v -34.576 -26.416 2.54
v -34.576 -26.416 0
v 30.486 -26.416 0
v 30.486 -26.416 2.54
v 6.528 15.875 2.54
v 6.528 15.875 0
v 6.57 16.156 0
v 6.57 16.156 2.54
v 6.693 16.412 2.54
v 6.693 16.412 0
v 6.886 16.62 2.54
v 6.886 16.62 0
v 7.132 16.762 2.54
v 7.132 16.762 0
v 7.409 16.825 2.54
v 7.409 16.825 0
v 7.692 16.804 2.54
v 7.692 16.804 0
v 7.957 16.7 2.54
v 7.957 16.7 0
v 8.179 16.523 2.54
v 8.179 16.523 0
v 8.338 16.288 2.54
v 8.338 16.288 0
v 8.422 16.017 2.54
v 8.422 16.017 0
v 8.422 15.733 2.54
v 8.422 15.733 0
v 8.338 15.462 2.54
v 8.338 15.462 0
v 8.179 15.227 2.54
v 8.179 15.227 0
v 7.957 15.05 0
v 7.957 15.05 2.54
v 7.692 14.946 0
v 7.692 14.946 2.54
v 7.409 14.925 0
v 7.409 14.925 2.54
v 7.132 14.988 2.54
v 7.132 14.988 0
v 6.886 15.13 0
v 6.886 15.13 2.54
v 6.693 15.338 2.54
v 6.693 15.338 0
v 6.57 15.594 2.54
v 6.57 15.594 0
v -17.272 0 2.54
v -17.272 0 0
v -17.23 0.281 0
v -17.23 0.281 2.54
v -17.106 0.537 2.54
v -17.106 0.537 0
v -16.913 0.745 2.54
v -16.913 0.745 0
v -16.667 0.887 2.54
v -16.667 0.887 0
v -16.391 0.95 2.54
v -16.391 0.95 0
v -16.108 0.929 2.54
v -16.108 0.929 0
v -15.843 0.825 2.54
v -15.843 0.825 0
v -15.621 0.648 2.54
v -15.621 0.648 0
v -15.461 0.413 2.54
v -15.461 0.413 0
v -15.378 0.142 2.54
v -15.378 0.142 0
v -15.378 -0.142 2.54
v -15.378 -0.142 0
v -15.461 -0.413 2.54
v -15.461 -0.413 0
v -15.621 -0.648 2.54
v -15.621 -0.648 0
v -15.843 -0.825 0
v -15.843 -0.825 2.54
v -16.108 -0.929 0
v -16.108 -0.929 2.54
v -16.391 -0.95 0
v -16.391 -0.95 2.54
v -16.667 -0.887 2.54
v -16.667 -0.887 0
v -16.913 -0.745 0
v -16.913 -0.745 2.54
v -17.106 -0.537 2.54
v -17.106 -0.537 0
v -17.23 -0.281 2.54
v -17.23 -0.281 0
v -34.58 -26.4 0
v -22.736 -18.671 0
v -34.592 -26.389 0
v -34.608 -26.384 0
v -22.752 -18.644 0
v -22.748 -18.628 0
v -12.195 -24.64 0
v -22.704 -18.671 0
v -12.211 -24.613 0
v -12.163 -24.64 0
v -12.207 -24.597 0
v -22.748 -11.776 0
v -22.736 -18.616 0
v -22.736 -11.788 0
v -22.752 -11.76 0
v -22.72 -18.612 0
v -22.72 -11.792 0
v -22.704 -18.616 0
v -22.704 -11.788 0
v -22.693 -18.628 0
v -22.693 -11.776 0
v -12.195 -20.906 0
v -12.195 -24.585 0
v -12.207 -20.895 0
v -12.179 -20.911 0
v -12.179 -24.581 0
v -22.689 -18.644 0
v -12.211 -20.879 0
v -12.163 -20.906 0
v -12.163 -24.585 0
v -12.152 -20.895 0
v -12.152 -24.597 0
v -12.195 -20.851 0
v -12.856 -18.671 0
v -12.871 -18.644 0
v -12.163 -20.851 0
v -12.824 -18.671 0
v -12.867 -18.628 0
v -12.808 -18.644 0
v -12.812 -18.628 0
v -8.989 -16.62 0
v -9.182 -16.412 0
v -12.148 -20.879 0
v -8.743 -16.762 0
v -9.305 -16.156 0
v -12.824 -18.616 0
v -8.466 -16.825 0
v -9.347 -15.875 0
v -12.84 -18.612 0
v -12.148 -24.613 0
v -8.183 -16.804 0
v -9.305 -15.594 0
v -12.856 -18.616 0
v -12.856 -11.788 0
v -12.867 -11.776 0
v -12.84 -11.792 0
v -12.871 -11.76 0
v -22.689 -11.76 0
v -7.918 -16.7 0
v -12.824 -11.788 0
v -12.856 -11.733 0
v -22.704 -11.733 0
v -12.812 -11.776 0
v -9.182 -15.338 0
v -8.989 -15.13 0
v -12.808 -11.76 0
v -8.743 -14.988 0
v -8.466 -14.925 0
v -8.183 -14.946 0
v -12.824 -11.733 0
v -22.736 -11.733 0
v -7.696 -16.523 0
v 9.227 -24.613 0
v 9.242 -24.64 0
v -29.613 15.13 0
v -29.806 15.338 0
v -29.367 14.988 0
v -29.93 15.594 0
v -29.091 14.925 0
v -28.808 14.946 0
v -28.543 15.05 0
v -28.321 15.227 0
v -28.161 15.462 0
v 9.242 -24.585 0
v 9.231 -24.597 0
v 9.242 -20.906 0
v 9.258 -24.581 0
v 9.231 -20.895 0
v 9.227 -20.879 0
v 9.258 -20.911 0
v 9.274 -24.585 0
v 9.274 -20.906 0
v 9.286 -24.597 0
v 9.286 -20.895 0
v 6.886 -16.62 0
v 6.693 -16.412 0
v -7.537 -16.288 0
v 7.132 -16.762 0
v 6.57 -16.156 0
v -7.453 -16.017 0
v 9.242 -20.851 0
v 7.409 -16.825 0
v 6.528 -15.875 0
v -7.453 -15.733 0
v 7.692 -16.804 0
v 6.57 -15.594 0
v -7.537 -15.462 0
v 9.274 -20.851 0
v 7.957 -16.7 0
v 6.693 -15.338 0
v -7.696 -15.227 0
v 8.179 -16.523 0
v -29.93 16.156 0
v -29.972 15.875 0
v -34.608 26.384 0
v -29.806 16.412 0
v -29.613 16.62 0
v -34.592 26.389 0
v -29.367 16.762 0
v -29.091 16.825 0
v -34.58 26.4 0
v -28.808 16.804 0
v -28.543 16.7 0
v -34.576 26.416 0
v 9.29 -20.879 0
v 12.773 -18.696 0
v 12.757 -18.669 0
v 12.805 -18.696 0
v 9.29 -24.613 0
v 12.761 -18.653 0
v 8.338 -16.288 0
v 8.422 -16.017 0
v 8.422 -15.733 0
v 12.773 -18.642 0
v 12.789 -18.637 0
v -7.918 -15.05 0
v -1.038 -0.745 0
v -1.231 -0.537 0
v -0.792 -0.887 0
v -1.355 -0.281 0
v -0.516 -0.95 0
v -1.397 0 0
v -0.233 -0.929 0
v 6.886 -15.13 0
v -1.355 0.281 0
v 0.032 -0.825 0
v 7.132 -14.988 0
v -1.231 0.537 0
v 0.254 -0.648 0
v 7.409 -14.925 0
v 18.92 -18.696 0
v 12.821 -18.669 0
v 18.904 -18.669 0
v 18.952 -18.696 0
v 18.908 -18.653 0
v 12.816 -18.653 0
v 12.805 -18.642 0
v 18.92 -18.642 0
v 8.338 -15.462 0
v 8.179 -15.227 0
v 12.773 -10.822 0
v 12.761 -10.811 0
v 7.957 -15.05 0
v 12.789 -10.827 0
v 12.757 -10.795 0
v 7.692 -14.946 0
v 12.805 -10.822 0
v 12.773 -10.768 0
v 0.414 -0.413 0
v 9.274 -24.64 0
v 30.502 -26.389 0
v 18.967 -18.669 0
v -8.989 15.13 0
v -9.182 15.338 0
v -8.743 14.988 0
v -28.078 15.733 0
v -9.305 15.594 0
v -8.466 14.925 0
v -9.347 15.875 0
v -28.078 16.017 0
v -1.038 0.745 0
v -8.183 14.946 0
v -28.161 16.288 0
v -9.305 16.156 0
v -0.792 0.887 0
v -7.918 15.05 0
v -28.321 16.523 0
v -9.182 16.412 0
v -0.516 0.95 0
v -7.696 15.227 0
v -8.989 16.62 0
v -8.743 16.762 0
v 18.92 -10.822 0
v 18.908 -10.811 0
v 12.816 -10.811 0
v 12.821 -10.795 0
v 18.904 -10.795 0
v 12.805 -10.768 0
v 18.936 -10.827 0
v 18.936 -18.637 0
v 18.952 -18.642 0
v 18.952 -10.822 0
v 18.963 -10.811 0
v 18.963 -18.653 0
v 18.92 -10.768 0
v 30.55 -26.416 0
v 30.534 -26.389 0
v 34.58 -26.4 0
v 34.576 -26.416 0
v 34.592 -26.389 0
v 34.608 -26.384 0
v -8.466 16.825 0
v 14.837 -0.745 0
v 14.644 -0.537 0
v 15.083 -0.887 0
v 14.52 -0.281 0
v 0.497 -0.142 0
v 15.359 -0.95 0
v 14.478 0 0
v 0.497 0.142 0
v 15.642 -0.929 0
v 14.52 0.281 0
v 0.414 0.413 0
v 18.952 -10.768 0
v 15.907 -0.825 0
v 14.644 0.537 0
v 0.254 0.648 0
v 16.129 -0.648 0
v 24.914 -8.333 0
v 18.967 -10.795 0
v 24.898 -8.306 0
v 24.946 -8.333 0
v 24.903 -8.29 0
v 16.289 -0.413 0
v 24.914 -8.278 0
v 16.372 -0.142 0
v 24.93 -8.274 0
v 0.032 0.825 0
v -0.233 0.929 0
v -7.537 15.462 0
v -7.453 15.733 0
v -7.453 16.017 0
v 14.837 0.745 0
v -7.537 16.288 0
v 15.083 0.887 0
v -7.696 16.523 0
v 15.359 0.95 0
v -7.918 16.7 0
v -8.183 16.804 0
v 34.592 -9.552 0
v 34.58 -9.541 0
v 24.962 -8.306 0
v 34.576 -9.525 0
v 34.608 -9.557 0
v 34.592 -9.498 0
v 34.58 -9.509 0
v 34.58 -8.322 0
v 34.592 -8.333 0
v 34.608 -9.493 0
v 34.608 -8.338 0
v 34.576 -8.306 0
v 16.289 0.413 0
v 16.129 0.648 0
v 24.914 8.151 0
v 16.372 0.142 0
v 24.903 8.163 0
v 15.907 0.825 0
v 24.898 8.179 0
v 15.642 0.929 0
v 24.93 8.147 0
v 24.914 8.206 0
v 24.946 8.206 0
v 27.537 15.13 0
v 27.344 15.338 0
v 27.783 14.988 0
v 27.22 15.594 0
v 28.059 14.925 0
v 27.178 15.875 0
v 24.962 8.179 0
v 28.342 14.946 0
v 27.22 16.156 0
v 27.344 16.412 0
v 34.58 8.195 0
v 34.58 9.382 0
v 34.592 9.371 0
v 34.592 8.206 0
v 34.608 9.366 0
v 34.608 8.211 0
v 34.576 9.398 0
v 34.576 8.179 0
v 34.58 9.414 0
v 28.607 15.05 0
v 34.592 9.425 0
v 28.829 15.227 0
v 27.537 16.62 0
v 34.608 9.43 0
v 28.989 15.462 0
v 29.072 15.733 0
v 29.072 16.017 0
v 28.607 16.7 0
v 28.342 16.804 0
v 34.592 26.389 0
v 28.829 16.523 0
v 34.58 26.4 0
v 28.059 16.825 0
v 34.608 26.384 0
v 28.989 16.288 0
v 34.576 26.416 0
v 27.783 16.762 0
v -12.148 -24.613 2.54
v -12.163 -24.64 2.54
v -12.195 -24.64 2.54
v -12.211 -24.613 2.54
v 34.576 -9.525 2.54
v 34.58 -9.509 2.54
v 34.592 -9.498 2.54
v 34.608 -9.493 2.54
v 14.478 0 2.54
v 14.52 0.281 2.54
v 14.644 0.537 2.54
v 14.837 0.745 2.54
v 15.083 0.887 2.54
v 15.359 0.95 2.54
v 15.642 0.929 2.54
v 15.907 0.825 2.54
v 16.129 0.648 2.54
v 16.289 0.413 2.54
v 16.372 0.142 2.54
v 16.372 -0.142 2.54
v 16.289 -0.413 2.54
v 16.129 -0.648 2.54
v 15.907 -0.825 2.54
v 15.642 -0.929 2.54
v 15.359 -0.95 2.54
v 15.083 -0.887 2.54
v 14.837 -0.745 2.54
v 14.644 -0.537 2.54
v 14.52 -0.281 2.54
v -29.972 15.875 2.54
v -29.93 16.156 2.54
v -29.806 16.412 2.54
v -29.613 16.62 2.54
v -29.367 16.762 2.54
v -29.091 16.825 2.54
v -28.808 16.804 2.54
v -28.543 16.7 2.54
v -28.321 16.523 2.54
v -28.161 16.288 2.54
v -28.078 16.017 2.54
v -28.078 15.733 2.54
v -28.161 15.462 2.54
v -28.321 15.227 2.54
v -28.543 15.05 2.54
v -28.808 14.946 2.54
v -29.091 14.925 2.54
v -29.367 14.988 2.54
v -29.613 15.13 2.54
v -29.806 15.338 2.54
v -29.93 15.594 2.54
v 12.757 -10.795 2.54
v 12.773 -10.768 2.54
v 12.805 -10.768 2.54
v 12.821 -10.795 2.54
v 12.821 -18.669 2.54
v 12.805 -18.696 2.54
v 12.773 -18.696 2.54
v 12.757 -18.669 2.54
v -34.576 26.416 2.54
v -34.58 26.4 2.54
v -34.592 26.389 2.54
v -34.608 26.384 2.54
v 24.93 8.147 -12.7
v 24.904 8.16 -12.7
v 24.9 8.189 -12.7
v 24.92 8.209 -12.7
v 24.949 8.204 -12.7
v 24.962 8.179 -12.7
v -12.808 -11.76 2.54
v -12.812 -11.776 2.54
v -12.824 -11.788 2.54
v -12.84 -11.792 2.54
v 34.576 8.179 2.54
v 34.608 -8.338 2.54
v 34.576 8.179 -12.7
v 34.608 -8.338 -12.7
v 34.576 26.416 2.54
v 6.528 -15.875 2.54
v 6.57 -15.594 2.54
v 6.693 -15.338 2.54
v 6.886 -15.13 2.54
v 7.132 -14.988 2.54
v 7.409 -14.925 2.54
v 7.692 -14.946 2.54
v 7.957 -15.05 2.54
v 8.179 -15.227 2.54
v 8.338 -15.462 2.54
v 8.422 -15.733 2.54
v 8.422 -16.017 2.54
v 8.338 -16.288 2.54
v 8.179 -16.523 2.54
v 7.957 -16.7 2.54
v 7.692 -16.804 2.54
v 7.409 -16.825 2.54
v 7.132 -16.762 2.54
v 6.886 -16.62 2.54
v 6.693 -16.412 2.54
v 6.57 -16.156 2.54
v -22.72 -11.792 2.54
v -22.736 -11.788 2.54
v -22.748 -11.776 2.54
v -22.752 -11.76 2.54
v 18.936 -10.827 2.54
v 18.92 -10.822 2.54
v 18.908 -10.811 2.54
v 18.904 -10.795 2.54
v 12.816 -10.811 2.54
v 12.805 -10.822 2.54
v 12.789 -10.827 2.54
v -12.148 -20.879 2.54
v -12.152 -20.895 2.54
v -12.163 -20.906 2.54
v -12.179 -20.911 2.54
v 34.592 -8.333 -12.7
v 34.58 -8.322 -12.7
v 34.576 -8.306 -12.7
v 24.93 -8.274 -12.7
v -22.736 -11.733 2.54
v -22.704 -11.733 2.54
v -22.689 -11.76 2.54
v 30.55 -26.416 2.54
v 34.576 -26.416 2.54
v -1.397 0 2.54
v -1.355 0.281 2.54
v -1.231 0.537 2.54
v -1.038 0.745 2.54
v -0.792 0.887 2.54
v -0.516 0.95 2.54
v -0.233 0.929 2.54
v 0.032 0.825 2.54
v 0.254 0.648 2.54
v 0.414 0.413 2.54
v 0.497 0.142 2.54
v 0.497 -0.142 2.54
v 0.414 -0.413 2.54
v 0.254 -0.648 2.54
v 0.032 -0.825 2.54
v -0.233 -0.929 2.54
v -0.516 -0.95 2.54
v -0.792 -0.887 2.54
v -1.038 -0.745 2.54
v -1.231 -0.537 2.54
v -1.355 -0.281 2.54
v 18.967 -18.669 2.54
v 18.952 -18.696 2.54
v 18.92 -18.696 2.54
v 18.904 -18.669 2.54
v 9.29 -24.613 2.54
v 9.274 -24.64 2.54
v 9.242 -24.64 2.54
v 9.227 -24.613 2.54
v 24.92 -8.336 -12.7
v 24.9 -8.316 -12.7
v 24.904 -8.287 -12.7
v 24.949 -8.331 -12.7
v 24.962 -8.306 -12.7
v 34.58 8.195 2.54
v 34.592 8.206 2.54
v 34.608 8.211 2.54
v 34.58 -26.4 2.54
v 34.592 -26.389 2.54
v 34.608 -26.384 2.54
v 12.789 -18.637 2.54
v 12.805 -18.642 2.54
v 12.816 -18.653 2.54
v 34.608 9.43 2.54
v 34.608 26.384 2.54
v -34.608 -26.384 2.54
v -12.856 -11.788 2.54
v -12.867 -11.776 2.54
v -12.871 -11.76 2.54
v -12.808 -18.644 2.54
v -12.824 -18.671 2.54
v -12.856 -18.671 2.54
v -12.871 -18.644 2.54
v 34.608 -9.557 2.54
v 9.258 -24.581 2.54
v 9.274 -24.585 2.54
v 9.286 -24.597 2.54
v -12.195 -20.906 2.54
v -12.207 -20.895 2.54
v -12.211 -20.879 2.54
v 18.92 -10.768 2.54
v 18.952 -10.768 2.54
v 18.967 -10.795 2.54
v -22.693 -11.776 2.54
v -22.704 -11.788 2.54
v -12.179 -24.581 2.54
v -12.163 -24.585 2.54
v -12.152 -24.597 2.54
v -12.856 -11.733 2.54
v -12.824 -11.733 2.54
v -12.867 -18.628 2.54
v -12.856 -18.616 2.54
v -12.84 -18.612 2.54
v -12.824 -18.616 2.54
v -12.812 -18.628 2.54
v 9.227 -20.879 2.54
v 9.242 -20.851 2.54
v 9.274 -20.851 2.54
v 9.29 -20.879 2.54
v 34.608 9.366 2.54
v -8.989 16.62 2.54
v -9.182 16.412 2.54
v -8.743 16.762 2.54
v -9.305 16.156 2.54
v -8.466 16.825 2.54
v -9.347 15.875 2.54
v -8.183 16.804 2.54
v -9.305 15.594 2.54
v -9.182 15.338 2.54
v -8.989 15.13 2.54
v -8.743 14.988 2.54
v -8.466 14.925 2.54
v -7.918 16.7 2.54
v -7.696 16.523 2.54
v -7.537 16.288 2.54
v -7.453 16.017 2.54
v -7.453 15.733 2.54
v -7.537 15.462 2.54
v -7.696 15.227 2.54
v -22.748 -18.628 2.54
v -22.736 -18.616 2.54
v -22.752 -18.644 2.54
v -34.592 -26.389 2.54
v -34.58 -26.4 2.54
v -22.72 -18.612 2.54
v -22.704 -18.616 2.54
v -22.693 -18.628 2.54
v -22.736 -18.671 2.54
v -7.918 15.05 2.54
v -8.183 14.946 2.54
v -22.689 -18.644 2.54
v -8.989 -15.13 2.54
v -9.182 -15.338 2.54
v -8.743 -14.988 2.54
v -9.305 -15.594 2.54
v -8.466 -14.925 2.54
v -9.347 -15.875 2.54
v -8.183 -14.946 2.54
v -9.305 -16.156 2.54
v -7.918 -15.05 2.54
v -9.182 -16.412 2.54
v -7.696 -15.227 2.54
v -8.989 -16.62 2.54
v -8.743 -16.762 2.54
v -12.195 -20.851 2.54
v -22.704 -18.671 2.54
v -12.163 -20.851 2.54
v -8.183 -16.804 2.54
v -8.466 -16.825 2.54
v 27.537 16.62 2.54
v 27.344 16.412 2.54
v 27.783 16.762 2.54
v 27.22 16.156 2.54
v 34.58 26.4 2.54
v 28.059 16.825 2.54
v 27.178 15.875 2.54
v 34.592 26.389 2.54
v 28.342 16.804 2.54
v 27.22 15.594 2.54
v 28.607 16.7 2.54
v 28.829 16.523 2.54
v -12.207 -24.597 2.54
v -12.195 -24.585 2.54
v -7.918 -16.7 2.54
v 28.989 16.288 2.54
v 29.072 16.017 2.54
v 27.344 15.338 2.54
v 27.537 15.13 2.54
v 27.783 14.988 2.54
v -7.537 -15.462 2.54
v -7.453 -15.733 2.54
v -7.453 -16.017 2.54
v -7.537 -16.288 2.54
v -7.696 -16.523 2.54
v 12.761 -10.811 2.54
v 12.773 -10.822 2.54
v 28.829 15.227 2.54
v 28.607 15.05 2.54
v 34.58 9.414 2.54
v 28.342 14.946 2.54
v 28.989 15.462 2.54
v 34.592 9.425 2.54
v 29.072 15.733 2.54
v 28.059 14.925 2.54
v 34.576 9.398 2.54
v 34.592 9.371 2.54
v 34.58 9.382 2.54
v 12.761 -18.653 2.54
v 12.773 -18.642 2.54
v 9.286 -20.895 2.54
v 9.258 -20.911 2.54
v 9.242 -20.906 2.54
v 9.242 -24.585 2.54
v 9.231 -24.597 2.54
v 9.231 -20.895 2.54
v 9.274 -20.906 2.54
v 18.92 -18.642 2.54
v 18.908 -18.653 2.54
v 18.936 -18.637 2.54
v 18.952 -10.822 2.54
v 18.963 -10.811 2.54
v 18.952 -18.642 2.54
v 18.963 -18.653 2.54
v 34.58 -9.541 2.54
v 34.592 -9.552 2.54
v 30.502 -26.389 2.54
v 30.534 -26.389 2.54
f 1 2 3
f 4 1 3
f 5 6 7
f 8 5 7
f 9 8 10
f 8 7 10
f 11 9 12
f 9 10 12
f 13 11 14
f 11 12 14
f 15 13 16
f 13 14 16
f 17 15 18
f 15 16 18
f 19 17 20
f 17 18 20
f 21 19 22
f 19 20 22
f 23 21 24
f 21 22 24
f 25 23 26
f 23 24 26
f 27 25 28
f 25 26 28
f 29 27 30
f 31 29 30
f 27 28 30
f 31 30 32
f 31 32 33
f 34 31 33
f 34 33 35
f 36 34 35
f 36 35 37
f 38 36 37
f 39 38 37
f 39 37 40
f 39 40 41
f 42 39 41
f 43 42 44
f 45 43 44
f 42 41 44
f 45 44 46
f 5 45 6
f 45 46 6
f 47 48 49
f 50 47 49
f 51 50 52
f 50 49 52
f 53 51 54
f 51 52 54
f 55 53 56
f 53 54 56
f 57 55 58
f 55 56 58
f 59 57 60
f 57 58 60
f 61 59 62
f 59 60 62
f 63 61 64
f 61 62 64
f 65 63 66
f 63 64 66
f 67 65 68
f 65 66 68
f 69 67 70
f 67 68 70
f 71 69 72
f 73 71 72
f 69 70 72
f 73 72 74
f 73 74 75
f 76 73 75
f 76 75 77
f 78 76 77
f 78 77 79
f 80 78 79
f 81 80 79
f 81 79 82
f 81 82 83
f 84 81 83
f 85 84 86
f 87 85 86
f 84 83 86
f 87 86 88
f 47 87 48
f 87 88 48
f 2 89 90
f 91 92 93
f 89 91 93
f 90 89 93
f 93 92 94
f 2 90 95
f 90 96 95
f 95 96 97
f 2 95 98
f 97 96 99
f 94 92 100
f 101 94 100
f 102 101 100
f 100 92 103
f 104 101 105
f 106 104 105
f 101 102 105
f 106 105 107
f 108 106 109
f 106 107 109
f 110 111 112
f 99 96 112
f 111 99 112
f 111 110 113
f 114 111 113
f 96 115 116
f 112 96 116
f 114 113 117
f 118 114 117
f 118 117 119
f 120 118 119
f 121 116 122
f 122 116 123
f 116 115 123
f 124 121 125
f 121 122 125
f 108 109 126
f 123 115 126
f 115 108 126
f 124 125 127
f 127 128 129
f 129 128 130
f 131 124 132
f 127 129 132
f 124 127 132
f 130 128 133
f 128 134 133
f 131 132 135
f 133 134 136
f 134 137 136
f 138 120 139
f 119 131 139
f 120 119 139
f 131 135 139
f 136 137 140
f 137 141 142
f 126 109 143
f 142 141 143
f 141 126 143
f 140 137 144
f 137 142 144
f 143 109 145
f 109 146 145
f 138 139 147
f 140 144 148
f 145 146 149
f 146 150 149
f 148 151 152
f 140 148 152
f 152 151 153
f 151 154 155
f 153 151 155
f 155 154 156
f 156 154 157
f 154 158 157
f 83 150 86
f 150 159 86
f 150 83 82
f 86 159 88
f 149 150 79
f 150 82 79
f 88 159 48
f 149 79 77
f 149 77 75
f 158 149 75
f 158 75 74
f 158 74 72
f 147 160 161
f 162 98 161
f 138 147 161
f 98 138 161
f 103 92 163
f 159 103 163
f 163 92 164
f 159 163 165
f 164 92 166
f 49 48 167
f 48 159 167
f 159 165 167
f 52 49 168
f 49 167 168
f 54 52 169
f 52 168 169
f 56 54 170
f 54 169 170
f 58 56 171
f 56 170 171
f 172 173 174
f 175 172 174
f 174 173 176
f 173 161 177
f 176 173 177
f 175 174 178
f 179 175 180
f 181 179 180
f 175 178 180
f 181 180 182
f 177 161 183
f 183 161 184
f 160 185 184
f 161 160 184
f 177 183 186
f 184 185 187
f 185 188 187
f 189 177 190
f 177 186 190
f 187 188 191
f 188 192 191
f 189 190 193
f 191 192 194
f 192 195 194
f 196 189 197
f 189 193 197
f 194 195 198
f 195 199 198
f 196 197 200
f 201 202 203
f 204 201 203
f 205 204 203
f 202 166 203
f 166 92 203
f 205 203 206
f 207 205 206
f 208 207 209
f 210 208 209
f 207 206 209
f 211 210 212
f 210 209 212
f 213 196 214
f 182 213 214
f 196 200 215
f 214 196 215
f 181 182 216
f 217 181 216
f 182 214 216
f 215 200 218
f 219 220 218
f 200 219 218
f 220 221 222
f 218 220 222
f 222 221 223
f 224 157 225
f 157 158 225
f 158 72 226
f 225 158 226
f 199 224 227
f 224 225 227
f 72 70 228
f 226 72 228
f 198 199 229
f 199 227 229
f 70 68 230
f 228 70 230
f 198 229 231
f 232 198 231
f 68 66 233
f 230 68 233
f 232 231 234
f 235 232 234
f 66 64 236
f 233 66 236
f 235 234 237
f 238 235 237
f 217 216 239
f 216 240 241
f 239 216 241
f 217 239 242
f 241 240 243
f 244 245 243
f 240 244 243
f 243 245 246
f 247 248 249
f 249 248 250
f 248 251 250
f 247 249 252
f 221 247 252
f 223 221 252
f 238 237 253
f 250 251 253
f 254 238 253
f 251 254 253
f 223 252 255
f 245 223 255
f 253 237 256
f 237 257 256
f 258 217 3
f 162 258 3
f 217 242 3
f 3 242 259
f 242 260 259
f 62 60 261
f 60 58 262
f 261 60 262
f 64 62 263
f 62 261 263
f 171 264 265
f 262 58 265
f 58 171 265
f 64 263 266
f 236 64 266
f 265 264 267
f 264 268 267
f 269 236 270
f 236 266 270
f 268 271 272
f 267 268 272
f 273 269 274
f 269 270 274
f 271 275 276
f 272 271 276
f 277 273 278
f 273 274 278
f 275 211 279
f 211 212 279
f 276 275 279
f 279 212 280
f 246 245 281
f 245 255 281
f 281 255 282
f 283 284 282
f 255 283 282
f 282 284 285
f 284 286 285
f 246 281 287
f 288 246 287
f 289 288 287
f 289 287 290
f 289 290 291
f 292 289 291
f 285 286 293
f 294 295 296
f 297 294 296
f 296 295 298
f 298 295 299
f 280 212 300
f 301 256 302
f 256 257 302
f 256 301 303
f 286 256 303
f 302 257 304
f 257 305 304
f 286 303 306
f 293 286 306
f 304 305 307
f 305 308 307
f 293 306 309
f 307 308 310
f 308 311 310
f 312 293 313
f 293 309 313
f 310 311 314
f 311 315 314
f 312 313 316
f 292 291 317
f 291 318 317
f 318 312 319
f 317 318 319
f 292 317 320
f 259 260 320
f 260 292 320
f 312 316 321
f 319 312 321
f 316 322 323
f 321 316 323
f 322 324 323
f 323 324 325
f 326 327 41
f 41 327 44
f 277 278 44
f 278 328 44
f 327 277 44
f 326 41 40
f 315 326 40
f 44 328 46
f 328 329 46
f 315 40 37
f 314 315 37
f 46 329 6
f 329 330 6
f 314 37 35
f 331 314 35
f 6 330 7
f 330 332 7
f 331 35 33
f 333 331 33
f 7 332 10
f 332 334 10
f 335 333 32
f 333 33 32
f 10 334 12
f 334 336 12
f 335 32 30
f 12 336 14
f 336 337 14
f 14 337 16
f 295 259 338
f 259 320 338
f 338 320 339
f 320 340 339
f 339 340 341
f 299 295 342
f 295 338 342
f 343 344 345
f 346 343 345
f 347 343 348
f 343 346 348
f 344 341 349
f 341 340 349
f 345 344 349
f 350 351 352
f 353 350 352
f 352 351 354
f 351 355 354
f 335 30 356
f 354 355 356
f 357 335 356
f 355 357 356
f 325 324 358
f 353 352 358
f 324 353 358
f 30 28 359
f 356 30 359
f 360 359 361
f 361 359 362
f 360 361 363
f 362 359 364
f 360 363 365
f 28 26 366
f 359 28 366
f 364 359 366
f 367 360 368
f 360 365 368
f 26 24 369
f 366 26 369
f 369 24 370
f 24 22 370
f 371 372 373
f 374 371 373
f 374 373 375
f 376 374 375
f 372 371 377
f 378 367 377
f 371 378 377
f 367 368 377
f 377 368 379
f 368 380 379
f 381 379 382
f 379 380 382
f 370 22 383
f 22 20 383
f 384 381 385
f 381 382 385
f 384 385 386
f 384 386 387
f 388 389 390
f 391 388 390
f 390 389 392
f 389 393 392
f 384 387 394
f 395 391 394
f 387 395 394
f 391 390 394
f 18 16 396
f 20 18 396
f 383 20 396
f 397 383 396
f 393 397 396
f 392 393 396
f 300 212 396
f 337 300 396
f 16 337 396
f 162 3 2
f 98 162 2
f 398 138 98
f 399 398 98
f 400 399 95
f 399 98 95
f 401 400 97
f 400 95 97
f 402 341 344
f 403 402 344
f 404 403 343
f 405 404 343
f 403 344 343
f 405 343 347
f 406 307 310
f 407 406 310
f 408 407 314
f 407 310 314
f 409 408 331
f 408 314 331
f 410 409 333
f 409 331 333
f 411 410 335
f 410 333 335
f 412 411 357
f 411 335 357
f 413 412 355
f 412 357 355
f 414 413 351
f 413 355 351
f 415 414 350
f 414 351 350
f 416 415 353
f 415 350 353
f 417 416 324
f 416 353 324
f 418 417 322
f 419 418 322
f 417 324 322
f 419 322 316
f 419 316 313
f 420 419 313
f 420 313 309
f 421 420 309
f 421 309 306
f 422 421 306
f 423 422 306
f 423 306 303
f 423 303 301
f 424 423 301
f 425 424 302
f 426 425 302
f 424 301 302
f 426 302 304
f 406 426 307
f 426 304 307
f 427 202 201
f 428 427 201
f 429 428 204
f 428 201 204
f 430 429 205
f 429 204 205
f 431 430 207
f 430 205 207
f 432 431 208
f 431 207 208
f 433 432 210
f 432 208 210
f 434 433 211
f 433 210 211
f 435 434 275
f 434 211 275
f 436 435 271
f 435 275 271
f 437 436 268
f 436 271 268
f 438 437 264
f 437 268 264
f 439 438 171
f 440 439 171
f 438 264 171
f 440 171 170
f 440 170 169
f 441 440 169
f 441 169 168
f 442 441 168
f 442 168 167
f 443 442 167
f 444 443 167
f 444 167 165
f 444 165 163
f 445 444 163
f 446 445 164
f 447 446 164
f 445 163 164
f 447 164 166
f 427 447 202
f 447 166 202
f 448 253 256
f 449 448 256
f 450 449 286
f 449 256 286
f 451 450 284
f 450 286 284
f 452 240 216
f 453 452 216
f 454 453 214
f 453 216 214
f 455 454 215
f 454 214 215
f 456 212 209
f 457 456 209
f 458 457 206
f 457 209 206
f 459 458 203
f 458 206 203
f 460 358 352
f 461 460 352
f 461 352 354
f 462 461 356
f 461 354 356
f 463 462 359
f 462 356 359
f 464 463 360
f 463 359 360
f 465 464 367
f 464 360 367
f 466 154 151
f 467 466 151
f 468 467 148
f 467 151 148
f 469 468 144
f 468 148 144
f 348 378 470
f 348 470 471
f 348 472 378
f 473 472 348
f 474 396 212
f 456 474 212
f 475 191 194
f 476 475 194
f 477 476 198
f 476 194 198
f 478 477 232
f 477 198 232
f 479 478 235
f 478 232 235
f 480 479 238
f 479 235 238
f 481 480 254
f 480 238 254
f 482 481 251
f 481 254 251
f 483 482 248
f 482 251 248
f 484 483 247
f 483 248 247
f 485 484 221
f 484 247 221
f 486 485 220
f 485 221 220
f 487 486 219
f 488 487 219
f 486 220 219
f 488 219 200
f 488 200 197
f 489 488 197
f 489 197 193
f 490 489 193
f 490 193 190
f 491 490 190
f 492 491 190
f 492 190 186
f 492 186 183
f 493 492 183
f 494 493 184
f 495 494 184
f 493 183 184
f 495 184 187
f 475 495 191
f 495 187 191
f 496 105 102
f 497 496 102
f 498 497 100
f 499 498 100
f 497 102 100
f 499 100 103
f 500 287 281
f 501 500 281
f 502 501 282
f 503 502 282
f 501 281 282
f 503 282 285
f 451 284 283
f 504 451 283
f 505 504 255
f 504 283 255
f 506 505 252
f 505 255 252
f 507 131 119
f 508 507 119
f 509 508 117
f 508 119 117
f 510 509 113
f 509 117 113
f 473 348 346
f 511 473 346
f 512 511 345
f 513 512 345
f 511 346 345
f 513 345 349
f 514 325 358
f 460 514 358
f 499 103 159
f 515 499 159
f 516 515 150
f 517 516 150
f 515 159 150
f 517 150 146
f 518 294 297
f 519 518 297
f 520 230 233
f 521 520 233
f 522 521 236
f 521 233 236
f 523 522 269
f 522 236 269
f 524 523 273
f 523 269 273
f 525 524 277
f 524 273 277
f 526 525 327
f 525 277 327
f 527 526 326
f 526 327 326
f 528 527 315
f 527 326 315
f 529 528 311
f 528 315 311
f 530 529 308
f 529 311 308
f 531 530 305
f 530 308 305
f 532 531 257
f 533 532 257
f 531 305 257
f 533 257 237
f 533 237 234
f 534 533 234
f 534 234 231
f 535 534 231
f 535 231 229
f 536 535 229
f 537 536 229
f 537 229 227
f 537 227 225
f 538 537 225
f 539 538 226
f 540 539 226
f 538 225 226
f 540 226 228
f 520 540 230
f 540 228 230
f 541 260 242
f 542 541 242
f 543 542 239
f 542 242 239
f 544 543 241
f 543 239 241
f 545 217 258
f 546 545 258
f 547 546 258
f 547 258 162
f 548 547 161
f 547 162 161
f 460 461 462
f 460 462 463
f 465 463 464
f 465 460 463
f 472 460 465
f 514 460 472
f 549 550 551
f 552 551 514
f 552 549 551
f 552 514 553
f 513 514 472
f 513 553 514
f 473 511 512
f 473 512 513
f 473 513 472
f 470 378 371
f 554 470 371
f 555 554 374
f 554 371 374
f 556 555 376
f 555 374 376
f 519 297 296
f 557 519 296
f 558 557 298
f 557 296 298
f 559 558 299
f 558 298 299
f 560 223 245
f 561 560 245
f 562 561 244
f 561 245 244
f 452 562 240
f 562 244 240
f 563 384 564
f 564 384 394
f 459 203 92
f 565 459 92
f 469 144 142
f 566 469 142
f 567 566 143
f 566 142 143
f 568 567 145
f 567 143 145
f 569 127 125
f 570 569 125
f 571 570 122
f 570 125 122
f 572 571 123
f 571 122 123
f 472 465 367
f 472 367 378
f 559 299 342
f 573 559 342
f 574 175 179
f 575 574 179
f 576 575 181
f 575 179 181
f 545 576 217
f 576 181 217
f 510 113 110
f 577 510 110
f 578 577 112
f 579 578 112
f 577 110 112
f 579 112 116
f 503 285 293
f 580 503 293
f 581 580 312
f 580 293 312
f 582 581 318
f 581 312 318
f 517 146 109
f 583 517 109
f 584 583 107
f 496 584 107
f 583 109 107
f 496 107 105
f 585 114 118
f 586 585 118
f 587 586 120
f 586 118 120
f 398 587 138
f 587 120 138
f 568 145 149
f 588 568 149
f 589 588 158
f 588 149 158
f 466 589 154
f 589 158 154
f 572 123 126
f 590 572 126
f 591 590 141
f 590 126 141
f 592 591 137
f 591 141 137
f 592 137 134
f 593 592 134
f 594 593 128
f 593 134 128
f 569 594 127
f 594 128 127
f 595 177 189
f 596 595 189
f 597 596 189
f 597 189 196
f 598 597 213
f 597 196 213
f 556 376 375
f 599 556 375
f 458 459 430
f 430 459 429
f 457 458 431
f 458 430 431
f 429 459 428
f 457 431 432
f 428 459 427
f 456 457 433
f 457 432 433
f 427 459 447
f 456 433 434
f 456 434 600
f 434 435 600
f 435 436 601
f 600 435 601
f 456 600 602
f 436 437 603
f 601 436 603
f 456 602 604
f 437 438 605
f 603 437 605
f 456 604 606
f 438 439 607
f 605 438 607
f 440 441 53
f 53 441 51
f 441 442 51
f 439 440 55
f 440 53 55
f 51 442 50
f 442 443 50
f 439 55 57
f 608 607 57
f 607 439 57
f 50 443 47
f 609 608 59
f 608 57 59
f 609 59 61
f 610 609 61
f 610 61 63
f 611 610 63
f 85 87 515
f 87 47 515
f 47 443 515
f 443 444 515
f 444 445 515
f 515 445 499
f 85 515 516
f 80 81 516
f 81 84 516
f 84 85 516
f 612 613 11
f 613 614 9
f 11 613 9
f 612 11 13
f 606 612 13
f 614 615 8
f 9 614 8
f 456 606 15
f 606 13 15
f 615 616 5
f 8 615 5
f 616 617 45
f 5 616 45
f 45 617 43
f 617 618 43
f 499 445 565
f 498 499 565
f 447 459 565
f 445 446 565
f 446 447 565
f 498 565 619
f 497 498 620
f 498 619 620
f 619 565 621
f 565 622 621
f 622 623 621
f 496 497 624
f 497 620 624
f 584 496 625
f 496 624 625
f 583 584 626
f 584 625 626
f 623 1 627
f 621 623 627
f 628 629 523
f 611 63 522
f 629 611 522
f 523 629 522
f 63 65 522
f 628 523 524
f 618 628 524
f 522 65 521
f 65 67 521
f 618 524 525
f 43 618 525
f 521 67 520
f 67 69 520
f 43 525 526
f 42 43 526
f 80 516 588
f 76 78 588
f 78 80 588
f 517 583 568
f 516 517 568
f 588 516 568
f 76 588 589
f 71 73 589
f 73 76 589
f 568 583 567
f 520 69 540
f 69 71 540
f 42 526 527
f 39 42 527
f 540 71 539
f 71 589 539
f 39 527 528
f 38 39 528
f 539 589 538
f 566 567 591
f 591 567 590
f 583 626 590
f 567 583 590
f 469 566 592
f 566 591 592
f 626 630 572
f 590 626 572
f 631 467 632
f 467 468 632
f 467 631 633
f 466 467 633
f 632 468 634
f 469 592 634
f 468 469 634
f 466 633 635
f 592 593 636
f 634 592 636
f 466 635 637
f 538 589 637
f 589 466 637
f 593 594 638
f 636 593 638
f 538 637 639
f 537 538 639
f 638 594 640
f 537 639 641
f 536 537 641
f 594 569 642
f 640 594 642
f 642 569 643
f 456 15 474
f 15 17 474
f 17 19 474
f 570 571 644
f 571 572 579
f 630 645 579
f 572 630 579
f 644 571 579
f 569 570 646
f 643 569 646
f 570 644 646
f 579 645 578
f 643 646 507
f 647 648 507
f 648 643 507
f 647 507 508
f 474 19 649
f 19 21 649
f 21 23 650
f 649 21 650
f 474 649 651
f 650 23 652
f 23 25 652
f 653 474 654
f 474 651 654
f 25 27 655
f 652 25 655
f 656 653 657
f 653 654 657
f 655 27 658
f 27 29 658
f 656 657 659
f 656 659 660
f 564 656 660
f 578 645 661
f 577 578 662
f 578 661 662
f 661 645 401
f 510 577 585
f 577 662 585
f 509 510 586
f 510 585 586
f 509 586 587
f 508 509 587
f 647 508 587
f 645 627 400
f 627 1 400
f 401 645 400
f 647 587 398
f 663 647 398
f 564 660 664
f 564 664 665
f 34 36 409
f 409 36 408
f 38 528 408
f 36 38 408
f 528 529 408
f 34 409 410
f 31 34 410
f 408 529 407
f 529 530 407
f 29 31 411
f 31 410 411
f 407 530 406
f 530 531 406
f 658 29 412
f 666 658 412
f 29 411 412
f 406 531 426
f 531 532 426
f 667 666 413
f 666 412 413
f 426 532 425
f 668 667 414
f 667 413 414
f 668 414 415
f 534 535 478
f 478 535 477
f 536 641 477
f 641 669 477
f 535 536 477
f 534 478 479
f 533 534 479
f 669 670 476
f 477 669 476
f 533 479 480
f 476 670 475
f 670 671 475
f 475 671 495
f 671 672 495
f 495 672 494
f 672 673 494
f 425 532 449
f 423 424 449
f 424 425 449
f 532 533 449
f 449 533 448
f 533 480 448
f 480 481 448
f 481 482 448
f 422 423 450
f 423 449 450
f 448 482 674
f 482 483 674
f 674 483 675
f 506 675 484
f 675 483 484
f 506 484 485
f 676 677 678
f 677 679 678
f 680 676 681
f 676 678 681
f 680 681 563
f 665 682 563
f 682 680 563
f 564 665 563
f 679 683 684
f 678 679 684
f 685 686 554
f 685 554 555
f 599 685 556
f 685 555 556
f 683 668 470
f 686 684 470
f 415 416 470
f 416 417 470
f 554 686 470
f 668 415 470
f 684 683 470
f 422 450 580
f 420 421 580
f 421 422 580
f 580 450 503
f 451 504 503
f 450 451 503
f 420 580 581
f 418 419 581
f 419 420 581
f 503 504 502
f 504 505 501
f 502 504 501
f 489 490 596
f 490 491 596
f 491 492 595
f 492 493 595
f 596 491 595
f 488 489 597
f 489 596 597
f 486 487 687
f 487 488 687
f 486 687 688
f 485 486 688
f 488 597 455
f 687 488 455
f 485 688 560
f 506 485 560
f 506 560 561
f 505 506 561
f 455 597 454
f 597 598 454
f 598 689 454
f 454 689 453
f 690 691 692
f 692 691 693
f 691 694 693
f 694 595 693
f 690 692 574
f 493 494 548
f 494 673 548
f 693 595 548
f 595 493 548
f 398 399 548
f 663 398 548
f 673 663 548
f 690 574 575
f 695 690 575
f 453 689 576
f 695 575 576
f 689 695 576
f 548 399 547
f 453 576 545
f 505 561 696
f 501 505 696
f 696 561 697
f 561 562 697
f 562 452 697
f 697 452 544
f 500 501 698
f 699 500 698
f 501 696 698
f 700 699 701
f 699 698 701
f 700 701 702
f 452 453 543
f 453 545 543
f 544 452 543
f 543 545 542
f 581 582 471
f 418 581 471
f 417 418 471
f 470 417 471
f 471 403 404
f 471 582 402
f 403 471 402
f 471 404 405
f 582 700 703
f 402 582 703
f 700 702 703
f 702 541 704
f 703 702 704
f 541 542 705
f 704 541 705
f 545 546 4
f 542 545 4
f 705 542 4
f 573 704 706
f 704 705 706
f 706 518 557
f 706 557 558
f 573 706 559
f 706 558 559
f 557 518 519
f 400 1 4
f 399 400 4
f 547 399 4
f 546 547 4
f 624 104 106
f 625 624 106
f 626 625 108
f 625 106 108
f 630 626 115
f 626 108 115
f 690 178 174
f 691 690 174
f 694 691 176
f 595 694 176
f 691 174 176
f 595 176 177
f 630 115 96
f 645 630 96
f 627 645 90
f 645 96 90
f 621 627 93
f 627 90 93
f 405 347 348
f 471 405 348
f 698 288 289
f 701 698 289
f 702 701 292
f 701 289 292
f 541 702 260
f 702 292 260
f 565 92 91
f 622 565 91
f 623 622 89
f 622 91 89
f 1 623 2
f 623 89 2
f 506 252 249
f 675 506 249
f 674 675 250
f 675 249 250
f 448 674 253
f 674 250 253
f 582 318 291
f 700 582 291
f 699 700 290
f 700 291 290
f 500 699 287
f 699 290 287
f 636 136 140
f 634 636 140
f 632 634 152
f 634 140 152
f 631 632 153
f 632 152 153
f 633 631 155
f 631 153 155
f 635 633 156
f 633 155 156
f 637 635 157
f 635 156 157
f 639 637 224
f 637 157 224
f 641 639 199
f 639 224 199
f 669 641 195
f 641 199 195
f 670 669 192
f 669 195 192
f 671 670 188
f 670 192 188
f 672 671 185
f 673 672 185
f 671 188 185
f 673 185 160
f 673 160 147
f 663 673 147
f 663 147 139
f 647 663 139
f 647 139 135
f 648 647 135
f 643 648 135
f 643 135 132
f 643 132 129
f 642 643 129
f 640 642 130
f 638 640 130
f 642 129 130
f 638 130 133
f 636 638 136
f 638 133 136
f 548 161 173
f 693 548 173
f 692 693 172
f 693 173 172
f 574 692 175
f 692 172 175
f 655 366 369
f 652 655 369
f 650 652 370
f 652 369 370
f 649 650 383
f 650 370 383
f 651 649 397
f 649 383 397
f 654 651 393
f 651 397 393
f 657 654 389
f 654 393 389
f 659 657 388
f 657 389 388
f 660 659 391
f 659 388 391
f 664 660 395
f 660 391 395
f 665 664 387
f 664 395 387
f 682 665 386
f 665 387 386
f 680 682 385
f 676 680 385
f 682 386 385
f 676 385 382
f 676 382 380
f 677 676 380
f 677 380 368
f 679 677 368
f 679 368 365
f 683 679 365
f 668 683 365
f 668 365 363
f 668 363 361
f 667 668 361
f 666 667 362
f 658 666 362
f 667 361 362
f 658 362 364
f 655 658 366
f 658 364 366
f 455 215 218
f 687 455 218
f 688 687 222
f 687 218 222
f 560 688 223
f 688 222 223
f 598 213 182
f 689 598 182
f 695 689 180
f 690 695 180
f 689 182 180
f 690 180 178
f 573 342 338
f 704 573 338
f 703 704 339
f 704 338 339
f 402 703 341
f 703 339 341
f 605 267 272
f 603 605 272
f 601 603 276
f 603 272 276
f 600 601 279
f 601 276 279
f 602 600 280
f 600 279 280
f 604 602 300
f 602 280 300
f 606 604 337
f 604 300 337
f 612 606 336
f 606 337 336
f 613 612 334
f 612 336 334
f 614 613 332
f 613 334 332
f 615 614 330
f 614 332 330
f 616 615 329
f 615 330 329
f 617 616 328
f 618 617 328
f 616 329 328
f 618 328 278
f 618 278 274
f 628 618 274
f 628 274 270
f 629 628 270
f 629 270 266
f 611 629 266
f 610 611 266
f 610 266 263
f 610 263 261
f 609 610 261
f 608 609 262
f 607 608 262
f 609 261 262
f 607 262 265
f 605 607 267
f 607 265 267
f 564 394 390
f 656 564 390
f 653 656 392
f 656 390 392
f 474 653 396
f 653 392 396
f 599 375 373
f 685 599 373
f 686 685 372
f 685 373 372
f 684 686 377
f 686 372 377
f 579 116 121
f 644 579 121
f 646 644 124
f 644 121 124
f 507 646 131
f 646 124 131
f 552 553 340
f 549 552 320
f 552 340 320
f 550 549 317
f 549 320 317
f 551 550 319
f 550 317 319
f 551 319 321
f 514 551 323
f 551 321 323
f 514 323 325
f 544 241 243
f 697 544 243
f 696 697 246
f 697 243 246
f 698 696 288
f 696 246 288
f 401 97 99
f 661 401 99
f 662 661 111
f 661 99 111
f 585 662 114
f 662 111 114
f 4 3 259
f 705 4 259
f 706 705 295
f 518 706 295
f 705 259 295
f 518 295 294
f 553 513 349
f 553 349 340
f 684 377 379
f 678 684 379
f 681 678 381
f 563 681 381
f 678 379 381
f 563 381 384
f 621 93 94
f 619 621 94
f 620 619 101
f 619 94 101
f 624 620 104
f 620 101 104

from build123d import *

# Parameters (mm, degrees)
F1_DEPTH = 2.54
F3_DEPTH = 12.7
F4_DEPTH = 2.54


# Not quite as in the source:
# - a feature names something its author has since deleted; it is built from what else it names


with BuildPart() as f1:
    # F0 (on Top) → F1 (new body)
    with BuildSketch(Plane.XY):
        with BuildLine():
            ThreePointArc((24.89835, -8.3058), (24.9076493597, -8.2833493597), (24.9301, -8.27405))
            Line((24.9301, -8.27405), (24.9301, 8.14705))
            ThreePointArc((24.9301, 8.14705), (24.9076493597, 8.1563493597), (24.89835, 8.1788))
            ThreePointArc((24.89835, 8.1788), (24.9301, 8.21055), (24.96185, 8.1788))
            Line((24.96185, 8.1788), (34.57575, 8.1788))
            ThreePointArc((34.57575, 8.1788), (34.5850493597, 8.2012506403), (34.6075, 8.21055))
            Line((34.6075, 8.21055), (34.6075, 9.36625))
            ThreePointArc((34.6075, 9.36625), (34.5850493597, 9.3755493597), (34.57575, 9.398))
            ThreePointArc((34.57575, 9.398), (34.5850493597, 9.4204506403), (34.6075, 9.42975))
            Line((34.6075, 9.42975), (34.6075, 26.38425))
            ThreePointArc((34.6075, 26.38425), (34.5850493597, 26.3935493597), (34.57575, 26.416))
            Line((34.57575, 26.416), (-34.57575, 26.416))
            ThreePointArc((-34.57575, 26.416), (-34.5850493597, 26.3935493597), (-34.6075, 26.38425))
            Line((-34.6075, 26.38425), (-34.6075, -26.38425))
            ThreePointArc((-34.6075, -26.38425), (-34.5850493597, -26.3935493597), (-34.57575, -26.416))
            Line((-34.57575, -26.416), (30.48635, -26.416))
            ThreePointArc((30.48635, -26.416), (30.5181, -26.38425), (30.54985, -26.416))
            Line((30.54985, -26.416), (34.57575, -26.416))
            ThreePointArc((34.57575, -26.416), (34.5850493597, -26.3935493597), (34.6075, -26.38425))
            Line((34.6075, -26.38425), (34.6075, -9.55675))
            ThreePointArc((34.6075, -9.55675), (34.5850493597, -9.5474506403), (34.57575, -9.525))
            ThreePointArc((34.57575, -9.525), (34.5850493597, -9.5025493597), (34.6075, -9.49325))
            Line((34.6075, -9.49325), (34.6075, -8.33755))
            ThreePointArc((34.6075, -8.33755), (34.5850493597, -8.3282506403), (34.57575, -8.3058))
            Line((34.57575, -8.3058), (24.96185, -8.3058))
            ThreePointArc((24.96185, -8.3058), (24.9301, -8.33755), (24.89835, -8.3058))
        make_face()
        with BuildLine():
            Line((-12.8397, -11.79195), (-12.8397, -18.61185))
            ThreePointArc((-12.8397, -18.61185), (-12.8172493597, -18.6211493597), (-12.80795, -18.6436))
            ThreePointArc((-12.80795, -18.6436), (-12.8397, -18.67535), (-12.87145, -18.6436))
            Line((-12.87145, -18.6436), (-22.68855, -18.6436))
            ThreePointArc((-22.68855, -18.6436), (-22.7203, -18.67535), (-22.75205, -18.6436))
            ThreePointArc((-22.75205, -18.6436), (-22.7427506403, -18.6211493597), (-22.7203, -18.61185))
            Line((-22.7203, -18.61185), (-22.7203, -11.79195))
            ThreePointArc((-22.7203, -11.79195), (-22.7427506403, -11.7826506403), (-22.75205, -11.7602))
            ThreePointArc((-22.75205, -11.7602), (-22.7203, -11.72845), (-22.68855, -11.7602))
            Line((-22.68855, -11.7602), (-12.87145, -11.7602))
            ThreePointArc((-12.87145, -11.7602), (-12.8397, -11.72845), (-12.80795, -11.7602))
            ThreePointArc((-12.80795, -11.7602), (-12.8172493597, -11.7826506403), (-12.8397, -11.79195))
        make_face(mode=Mode.SUBTRACT)
        with BuildLine():
            ThreePointArc((-12.21105, -24.6126), (-12.2017506403, -24.5901493597), (-12.1793, -24.58085))
            Line((-12.1793, -24.58085), (-12.1793, -20.91055))
            ThreePointArc((-12.1793, -20.91055), (-12.2017506403, -20.9012506403), (-12.21105, -20.8788))
            ThreePointArc((-12.21105, -20.8788), (-12.1793, -20.84705), (-12.14755, -20.8788))
            Line((-12.14755, -20.8788), (9.22655, -20.8788))
            ThreePointArc((9.22655, -20.8788), (9.2583, -20.84705), (9.29005, -20.8788))
            ThreePointArc((9.29005, -20.8788), (9.2807506403, -20.9012506403), (9.2583, -20.91055))
            Line((9.2583, -20.91055), (9.2583, -24.58085))
            ThreePointArc((9.2583, -24.58085), (9.2807506403, -24.5901493597), (9.29005, -24.6126))
            ThreePointArc((9.29005, -24.6126), (9.2583, -24.64435), (9.22655, -24.6126))
            Line((9.22655, -24.6126), (-12.14755, -24.6126))
            ThreePointArc((-12.14755, -24.6126), (-12.1793, -24.64435), (-12.21105, -24.6126))
        make_face(mode=Mode.SUBTRACT)
        with BuildLine():
            ThreePointArc((-7.4422, -15.875), (-8.3947, -16.8275), (-9.3472, -15.875))
            ThreePointArc((-9.3472, -15.875), (-8.3947, -14.9225), (-7.4422, -15.875))
        make_face(mode=Mode.SUBTRACT)
        with BuildLine():
            ThreePointArc((8.4328, -15.875), (7.4803, -16.8275), (6.5278, -15.875))
            ThreePointArc((6.5278, -15.875), (7.4803, -14.9225), (8.4328, -15.875))
        make_face(mode=Mode.SUBTRACT)
        with BuildLine():
            ThreePointArc((12.75715, -18.669), (12.7664493597, -18.6465493597), (12.7889, -18.63725))
            Line((12.7889, -18.63725), (12.7889, -10.82675))
            ThreePointArc((12.7889, -10.82675), (12.7664493597, -10.8174506403), (12.75715, -10.795))
            ThreePointArc((12.75715, -10.795), (12.7889, -10.76325), (12.82065, -10.795))
            Line((12.82065, -10.795), (18.90395, -10.795))
            ThreePointArc((18.90395, -10.795), (18.9357, -10.76325), (18.96745, -10.795))
            ThreePointArc((18.96745, -10.795), (18.9581506403, -10.8174506403), (18.9357, -10.82675))
            Line((18.9357, -10.82675), (18.9357, -18.63725))
            ThreePointArc((18.9357, -18.63725), (18.9581506403, -18.6465493597), (18.96745, -18.669))
            ThreePointArc((18.96745, -18.669), (18.9357, -18.70075), (18.90395, -18.669))
            Line((18.90395, -18.669), (12.82065, -18.669))
            ThreePointArc((12.82065, -18.669), (12.7889, -18.70075), (12.75715, -18.669))
        make_face(mode=Mode.SUBTRACT)
        with BuildLine():
            ThreePointArc((-15.367, 0), (-16.3195, -0.9525), (-17.272, 0))
            ThreePointArc((-17.272, 0), (-16.3195, 0.9525), (-15.367, 0))
        make_face(mode=Mode.SUBTRACT)
        with BuildLine():
            ThreePointArc((0.508, 0), (-0.4445, -0.9525), (-1.397, 0))
            ThreePointArc((-1.397, 0), (-0.4445, 0.9525), (0.508, 0))
        make_face(mode=Mode.SUBTRACT)
        with BuildLine():
            ThreePointArc((-28.067, 15.875), (-29.0195, 14.9225), (-29.972, 15.875))
            ThreePointArc((-29.972, 15.875), (-29.0195, 16.8275), (-28.067, 15.875))
        make_face(mode=Mode.SUBTRACT)
        with BuildLine():
            ThreePointArc((-7.4422, 15.875), (-8.3947, 14.9225), (-9.3472, 15.875))
            ThreePointArc((-9.3472, 15.875), (-8.3947, 16.8275), (-7.4422, 15.875))
        make_face(mode=Mode.SUBTRACT)
        with BuildLine():
            ThreePointArc((16.383, 0), (15.4305, -0.9525), (14.478, 0))
            ThreePointArc((14.478, 0), (15.4305, 0.9525), (16.383, 0))
        make_face(mode=Mode.SUBTRACT)
        with BuildLine():
            ThreePointArc((8.4328, 15.875), (7.4803, 14.9225), (6.5278, 15.875))
            ThreePointArc((6.5278, 15.875), (7.4803, 16.8275), (8.4328, 15.875))
        make_face(mode=Mode.SUBTRACT)
        with BuildLine():
            ThreePointArc((29.083, 15.875), (28.1305, 14.9225), (27.178, 15.875))
            ThreePointArc((27.178, 15.875), (28.1305, 16.8275), (29.083, 15.875))
        make_face(mode=Mode.SUBTRACT)
        with BuildLine():
            Line((12.7889, -10.82675), (12.7889, -18.63725))
            ThreePointArc((12.7889, -18.63725), (12.8113506403, -18.6465493597), (12.82065, -18.669))
            Line((12.82065, -18.669), (18.90395, -18.669))
            ThreePointArc((18.90395, -18.669), (18.9132493597, -18.6465493597), (18.9357, -18.63725))
            Line((18.9357, -18.63725), (18.9357, -10.82675))
            ThreePointArc((18.9357, -10.82675), (18.9132493597, -10.8174506403), (18.90395, -10.795))
            Line((18.90395, -10.795), (12.82065, -10.795))
            ThreePointArc((12.82065, -10.795), (12.8113506403, -10.8174506403), (12.7889, -10.82675))
        make_face()
        with BuildLine():
            Line((-12.1793, -20.91055), (-12.1793, -24.58085))
            ThreePointArc((-12.1793, -24.58085), (-12.1568493597, -24.5901493597), (-12.14755, -24.6126))
            Line((-12.14755, -24.6126), (9.22655, -24.6126))
            ThreePointArc((9.22655, -24.6126), (9.2358493597, -24.5901493597), (9.2583, -24.58085))
            Line((9.2583, -24.58085), (9.2583, -20.91055))
            ThreePointArc((9.2583, -20.91055), (9.2358493597, -20.9012506403), (9.22655, -20.8788))
            Line((9.22655, -20.8788), (-12.14755, -20.8788))
            ThreePointArc((-12.14755, -20.8788), (-12.1568493597, -20.9012506403), (-12.1793, -20.91055))
        make_face()
        with BuildLine():
            ThreePointArc((-12.87145, -18.6436), (-12.8621506403, -18.6211493597), (-12.8397, -18.61185))
            Line((-12.8397, -18.61185), (-12.8397, -11.79195))
            ThreePointArc((-12.8397, -11.79195), (-12.8621506403, -11.7826506403), (-12.87145, -11.7602))
            Line((-12.87145, -11.7602), (-22.68855, -11.7602))
            ThreePointArc((-22.68855, -11.7602), (-22.6978493597, -11.7826506403), (-22.7203, -11.79195))
            Line((-22.7203, -11.79195), (-22.7203, -18.61185))
            ThreePointArc((-22.7203, -18.61185), (-22.6978493597, -18.6211493597), (-22.68855, -18.6436))
            Line((-22.68855, -18.6436), (-12.87145, -18.6436))
        make_face()
    extrude(amount=F1_DEPTH)

    # F2 (on face) → F3 (join)
    with BuildSketch(Plane(origin=(0, 0, 0), x_dir=(1, 0, 0), z_dir=(0, 0, -1))):
        with BuildLine():
            Line((24.96185, -8.1788), (34.57575, -8.1788))
            Line((34.57575, -8.1788), (34.6075, 8.33755))
            ThreePointArc((34.6075, 8.33755), (34.5850493597, 8.3282506403), (34.57575, 8.3058))
            Line((34.57575, 8.3058), (24.96185, 8.3058))
            ThreePointArc((24.96185, 8.3058), (24.9076493597, 8.3282506403), (24.9301, 8.27405))
            Line((24.9301, 8.27405), (24.9301, -8.14705))
            ThreePointArc((24.9301, -8.14705), (24.9076493597, -8.2012506403), (24.96185, -8.1788))
        make_face()
    extrude(amount=F3_DEPTH)

    # F4 (add): a face of the model
    f4_faces = [f1.faces().sort_by_distance(p)[0] for p in [
        (29.7607313536, -0.0680465181, 0),
    ]]
    extrude(f4_faces, amount=F4_DEPTH)


solid = f1.part
